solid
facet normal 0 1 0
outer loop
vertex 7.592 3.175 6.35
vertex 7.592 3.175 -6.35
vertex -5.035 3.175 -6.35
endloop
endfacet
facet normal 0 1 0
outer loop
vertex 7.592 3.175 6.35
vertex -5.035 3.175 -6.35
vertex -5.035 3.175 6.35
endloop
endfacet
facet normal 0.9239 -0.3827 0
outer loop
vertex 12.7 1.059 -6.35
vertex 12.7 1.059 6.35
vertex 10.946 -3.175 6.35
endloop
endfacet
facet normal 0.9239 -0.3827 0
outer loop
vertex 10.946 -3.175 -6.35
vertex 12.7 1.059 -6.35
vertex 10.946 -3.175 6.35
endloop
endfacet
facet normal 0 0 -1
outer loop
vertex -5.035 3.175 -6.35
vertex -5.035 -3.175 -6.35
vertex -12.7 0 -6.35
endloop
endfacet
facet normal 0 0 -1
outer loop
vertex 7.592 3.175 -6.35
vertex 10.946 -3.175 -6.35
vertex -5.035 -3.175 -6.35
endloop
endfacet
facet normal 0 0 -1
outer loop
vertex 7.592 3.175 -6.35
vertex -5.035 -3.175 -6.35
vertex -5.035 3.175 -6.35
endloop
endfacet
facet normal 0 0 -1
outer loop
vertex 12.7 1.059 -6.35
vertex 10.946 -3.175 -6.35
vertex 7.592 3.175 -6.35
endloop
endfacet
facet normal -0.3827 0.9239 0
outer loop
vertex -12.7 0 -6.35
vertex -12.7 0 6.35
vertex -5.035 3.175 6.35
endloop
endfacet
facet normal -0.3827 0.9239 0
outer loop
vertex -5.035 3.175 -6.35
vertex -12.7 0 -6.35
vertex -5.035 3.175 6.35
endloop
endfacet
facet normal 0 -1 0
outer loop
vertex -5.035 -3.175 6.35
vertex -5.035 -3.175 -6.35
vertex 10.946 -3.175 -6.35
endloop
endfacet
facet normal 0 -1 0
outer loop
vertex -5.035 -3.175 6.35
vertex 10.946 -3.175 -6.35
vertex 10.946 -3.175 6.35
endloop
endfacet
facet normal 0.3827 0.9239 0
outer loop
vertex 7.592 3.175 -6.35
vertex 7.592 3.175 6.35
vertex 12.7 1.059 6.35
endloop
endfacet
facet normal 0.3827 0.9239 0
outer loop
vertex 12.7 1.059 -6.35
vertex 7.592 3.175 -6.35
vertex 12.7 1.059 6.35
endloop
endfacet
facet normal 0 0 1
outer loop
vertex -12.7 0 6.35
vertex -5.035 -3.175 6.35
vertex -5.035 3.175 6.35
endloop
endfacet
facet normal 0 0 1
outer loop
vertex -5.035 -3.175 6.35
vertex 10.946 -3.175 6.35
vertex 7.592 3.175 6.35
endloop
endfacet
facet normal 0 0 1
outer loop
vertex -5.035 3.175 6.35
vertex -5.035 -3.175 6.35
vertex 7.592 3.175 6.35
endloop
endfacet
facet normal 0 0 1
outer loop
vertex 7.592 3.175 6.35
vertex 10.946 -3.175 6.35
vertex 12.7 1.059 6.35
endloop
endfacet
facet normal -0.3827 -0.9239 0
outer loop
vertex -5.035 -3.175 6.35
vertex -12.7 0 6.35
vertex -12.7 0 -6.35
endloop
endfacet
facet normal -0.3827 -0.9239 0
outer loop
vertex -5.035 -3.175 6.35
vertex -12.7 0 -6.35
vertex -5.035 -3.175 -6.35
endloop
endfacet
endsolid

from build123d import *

# Parameters (mm, degrees)
F0_W          = 6.35
F0_H          = 12.7
F1_DEPTH      = 12.7
F3_DEPTH      = 6.351
F3_DEPTH_BACK = 6.351
F5_DEPTH      = 6.351
F5_DEPTH_BACK = 6.351
F7_DEPTH      = 6.351
F7_DEPTH_BACK = 6.351


# Not quite as in the source:
# - a pattern or mirror of a feature is missing from the dataset's text; its kind, count and spacing are read off the source's solid


with BuildPart() as f1:
    # F0 (on Right) → F1 (new body, symmetric)
    with BuildSketch(Plane.YZ):
        Rectangle(F0_W, F0_H)
    extrude(amount=F1_DEPTH, both=True)

    # F2 (on Top) → F3 (cut, two sides)
    with BuildSketch(Plane.XY) as f3_sk:
        Polygon((-12.7, 3.175), (-12.7, 0), (-5.0348719395, 3.175), align=None)
    f3 = extrude(amount=-F3_DEPTH, mode=Mode.SUBTRACT) + extrude(f3_sk.sketch, amount=F3_DEPTH_BACK, mode=Mode.SUBTRACT)

    # F3_copies: F3 across plane
    add(f3.mirror(Plane(origin=(0, 0, 0), x_dir=(0, 0, -1), z_dir=(0, -1, 0))), mode=Mode.SUBTRACT)

    # F4 (on Top) → F5 (cut, two sides)
    with BuildSketch(Plane.XY) as f5_sk:
        Polygon((17.9670583457, 3.175), (7.5919586605, 3.175), (12.7, 1.05918), align=None)
    extrude(amount=-F5_DEPTH, mode=Mode.SUBTRACT)
    extrude(f5_sk.sketch, amount=F5_DEPTH_BACK, mode=Mode.SUBTRACT)

    # F6 (on Top) → F7 (cut, two sides)
    with BuildSketch(Plane.XY) as f7_sk:
        Polygon((12.7, 1.05918), (10.9461452185, -3.175), (12.7, -3.175), align=None)
    extrude(amount=-F7_DEPTH, mode=Mode.SUBTRACT)
    extrude(f7_sk.sketch, amount=F7_DEPTH_BACK, mode=Mode.SUBTRACT)


solid = f1.part
